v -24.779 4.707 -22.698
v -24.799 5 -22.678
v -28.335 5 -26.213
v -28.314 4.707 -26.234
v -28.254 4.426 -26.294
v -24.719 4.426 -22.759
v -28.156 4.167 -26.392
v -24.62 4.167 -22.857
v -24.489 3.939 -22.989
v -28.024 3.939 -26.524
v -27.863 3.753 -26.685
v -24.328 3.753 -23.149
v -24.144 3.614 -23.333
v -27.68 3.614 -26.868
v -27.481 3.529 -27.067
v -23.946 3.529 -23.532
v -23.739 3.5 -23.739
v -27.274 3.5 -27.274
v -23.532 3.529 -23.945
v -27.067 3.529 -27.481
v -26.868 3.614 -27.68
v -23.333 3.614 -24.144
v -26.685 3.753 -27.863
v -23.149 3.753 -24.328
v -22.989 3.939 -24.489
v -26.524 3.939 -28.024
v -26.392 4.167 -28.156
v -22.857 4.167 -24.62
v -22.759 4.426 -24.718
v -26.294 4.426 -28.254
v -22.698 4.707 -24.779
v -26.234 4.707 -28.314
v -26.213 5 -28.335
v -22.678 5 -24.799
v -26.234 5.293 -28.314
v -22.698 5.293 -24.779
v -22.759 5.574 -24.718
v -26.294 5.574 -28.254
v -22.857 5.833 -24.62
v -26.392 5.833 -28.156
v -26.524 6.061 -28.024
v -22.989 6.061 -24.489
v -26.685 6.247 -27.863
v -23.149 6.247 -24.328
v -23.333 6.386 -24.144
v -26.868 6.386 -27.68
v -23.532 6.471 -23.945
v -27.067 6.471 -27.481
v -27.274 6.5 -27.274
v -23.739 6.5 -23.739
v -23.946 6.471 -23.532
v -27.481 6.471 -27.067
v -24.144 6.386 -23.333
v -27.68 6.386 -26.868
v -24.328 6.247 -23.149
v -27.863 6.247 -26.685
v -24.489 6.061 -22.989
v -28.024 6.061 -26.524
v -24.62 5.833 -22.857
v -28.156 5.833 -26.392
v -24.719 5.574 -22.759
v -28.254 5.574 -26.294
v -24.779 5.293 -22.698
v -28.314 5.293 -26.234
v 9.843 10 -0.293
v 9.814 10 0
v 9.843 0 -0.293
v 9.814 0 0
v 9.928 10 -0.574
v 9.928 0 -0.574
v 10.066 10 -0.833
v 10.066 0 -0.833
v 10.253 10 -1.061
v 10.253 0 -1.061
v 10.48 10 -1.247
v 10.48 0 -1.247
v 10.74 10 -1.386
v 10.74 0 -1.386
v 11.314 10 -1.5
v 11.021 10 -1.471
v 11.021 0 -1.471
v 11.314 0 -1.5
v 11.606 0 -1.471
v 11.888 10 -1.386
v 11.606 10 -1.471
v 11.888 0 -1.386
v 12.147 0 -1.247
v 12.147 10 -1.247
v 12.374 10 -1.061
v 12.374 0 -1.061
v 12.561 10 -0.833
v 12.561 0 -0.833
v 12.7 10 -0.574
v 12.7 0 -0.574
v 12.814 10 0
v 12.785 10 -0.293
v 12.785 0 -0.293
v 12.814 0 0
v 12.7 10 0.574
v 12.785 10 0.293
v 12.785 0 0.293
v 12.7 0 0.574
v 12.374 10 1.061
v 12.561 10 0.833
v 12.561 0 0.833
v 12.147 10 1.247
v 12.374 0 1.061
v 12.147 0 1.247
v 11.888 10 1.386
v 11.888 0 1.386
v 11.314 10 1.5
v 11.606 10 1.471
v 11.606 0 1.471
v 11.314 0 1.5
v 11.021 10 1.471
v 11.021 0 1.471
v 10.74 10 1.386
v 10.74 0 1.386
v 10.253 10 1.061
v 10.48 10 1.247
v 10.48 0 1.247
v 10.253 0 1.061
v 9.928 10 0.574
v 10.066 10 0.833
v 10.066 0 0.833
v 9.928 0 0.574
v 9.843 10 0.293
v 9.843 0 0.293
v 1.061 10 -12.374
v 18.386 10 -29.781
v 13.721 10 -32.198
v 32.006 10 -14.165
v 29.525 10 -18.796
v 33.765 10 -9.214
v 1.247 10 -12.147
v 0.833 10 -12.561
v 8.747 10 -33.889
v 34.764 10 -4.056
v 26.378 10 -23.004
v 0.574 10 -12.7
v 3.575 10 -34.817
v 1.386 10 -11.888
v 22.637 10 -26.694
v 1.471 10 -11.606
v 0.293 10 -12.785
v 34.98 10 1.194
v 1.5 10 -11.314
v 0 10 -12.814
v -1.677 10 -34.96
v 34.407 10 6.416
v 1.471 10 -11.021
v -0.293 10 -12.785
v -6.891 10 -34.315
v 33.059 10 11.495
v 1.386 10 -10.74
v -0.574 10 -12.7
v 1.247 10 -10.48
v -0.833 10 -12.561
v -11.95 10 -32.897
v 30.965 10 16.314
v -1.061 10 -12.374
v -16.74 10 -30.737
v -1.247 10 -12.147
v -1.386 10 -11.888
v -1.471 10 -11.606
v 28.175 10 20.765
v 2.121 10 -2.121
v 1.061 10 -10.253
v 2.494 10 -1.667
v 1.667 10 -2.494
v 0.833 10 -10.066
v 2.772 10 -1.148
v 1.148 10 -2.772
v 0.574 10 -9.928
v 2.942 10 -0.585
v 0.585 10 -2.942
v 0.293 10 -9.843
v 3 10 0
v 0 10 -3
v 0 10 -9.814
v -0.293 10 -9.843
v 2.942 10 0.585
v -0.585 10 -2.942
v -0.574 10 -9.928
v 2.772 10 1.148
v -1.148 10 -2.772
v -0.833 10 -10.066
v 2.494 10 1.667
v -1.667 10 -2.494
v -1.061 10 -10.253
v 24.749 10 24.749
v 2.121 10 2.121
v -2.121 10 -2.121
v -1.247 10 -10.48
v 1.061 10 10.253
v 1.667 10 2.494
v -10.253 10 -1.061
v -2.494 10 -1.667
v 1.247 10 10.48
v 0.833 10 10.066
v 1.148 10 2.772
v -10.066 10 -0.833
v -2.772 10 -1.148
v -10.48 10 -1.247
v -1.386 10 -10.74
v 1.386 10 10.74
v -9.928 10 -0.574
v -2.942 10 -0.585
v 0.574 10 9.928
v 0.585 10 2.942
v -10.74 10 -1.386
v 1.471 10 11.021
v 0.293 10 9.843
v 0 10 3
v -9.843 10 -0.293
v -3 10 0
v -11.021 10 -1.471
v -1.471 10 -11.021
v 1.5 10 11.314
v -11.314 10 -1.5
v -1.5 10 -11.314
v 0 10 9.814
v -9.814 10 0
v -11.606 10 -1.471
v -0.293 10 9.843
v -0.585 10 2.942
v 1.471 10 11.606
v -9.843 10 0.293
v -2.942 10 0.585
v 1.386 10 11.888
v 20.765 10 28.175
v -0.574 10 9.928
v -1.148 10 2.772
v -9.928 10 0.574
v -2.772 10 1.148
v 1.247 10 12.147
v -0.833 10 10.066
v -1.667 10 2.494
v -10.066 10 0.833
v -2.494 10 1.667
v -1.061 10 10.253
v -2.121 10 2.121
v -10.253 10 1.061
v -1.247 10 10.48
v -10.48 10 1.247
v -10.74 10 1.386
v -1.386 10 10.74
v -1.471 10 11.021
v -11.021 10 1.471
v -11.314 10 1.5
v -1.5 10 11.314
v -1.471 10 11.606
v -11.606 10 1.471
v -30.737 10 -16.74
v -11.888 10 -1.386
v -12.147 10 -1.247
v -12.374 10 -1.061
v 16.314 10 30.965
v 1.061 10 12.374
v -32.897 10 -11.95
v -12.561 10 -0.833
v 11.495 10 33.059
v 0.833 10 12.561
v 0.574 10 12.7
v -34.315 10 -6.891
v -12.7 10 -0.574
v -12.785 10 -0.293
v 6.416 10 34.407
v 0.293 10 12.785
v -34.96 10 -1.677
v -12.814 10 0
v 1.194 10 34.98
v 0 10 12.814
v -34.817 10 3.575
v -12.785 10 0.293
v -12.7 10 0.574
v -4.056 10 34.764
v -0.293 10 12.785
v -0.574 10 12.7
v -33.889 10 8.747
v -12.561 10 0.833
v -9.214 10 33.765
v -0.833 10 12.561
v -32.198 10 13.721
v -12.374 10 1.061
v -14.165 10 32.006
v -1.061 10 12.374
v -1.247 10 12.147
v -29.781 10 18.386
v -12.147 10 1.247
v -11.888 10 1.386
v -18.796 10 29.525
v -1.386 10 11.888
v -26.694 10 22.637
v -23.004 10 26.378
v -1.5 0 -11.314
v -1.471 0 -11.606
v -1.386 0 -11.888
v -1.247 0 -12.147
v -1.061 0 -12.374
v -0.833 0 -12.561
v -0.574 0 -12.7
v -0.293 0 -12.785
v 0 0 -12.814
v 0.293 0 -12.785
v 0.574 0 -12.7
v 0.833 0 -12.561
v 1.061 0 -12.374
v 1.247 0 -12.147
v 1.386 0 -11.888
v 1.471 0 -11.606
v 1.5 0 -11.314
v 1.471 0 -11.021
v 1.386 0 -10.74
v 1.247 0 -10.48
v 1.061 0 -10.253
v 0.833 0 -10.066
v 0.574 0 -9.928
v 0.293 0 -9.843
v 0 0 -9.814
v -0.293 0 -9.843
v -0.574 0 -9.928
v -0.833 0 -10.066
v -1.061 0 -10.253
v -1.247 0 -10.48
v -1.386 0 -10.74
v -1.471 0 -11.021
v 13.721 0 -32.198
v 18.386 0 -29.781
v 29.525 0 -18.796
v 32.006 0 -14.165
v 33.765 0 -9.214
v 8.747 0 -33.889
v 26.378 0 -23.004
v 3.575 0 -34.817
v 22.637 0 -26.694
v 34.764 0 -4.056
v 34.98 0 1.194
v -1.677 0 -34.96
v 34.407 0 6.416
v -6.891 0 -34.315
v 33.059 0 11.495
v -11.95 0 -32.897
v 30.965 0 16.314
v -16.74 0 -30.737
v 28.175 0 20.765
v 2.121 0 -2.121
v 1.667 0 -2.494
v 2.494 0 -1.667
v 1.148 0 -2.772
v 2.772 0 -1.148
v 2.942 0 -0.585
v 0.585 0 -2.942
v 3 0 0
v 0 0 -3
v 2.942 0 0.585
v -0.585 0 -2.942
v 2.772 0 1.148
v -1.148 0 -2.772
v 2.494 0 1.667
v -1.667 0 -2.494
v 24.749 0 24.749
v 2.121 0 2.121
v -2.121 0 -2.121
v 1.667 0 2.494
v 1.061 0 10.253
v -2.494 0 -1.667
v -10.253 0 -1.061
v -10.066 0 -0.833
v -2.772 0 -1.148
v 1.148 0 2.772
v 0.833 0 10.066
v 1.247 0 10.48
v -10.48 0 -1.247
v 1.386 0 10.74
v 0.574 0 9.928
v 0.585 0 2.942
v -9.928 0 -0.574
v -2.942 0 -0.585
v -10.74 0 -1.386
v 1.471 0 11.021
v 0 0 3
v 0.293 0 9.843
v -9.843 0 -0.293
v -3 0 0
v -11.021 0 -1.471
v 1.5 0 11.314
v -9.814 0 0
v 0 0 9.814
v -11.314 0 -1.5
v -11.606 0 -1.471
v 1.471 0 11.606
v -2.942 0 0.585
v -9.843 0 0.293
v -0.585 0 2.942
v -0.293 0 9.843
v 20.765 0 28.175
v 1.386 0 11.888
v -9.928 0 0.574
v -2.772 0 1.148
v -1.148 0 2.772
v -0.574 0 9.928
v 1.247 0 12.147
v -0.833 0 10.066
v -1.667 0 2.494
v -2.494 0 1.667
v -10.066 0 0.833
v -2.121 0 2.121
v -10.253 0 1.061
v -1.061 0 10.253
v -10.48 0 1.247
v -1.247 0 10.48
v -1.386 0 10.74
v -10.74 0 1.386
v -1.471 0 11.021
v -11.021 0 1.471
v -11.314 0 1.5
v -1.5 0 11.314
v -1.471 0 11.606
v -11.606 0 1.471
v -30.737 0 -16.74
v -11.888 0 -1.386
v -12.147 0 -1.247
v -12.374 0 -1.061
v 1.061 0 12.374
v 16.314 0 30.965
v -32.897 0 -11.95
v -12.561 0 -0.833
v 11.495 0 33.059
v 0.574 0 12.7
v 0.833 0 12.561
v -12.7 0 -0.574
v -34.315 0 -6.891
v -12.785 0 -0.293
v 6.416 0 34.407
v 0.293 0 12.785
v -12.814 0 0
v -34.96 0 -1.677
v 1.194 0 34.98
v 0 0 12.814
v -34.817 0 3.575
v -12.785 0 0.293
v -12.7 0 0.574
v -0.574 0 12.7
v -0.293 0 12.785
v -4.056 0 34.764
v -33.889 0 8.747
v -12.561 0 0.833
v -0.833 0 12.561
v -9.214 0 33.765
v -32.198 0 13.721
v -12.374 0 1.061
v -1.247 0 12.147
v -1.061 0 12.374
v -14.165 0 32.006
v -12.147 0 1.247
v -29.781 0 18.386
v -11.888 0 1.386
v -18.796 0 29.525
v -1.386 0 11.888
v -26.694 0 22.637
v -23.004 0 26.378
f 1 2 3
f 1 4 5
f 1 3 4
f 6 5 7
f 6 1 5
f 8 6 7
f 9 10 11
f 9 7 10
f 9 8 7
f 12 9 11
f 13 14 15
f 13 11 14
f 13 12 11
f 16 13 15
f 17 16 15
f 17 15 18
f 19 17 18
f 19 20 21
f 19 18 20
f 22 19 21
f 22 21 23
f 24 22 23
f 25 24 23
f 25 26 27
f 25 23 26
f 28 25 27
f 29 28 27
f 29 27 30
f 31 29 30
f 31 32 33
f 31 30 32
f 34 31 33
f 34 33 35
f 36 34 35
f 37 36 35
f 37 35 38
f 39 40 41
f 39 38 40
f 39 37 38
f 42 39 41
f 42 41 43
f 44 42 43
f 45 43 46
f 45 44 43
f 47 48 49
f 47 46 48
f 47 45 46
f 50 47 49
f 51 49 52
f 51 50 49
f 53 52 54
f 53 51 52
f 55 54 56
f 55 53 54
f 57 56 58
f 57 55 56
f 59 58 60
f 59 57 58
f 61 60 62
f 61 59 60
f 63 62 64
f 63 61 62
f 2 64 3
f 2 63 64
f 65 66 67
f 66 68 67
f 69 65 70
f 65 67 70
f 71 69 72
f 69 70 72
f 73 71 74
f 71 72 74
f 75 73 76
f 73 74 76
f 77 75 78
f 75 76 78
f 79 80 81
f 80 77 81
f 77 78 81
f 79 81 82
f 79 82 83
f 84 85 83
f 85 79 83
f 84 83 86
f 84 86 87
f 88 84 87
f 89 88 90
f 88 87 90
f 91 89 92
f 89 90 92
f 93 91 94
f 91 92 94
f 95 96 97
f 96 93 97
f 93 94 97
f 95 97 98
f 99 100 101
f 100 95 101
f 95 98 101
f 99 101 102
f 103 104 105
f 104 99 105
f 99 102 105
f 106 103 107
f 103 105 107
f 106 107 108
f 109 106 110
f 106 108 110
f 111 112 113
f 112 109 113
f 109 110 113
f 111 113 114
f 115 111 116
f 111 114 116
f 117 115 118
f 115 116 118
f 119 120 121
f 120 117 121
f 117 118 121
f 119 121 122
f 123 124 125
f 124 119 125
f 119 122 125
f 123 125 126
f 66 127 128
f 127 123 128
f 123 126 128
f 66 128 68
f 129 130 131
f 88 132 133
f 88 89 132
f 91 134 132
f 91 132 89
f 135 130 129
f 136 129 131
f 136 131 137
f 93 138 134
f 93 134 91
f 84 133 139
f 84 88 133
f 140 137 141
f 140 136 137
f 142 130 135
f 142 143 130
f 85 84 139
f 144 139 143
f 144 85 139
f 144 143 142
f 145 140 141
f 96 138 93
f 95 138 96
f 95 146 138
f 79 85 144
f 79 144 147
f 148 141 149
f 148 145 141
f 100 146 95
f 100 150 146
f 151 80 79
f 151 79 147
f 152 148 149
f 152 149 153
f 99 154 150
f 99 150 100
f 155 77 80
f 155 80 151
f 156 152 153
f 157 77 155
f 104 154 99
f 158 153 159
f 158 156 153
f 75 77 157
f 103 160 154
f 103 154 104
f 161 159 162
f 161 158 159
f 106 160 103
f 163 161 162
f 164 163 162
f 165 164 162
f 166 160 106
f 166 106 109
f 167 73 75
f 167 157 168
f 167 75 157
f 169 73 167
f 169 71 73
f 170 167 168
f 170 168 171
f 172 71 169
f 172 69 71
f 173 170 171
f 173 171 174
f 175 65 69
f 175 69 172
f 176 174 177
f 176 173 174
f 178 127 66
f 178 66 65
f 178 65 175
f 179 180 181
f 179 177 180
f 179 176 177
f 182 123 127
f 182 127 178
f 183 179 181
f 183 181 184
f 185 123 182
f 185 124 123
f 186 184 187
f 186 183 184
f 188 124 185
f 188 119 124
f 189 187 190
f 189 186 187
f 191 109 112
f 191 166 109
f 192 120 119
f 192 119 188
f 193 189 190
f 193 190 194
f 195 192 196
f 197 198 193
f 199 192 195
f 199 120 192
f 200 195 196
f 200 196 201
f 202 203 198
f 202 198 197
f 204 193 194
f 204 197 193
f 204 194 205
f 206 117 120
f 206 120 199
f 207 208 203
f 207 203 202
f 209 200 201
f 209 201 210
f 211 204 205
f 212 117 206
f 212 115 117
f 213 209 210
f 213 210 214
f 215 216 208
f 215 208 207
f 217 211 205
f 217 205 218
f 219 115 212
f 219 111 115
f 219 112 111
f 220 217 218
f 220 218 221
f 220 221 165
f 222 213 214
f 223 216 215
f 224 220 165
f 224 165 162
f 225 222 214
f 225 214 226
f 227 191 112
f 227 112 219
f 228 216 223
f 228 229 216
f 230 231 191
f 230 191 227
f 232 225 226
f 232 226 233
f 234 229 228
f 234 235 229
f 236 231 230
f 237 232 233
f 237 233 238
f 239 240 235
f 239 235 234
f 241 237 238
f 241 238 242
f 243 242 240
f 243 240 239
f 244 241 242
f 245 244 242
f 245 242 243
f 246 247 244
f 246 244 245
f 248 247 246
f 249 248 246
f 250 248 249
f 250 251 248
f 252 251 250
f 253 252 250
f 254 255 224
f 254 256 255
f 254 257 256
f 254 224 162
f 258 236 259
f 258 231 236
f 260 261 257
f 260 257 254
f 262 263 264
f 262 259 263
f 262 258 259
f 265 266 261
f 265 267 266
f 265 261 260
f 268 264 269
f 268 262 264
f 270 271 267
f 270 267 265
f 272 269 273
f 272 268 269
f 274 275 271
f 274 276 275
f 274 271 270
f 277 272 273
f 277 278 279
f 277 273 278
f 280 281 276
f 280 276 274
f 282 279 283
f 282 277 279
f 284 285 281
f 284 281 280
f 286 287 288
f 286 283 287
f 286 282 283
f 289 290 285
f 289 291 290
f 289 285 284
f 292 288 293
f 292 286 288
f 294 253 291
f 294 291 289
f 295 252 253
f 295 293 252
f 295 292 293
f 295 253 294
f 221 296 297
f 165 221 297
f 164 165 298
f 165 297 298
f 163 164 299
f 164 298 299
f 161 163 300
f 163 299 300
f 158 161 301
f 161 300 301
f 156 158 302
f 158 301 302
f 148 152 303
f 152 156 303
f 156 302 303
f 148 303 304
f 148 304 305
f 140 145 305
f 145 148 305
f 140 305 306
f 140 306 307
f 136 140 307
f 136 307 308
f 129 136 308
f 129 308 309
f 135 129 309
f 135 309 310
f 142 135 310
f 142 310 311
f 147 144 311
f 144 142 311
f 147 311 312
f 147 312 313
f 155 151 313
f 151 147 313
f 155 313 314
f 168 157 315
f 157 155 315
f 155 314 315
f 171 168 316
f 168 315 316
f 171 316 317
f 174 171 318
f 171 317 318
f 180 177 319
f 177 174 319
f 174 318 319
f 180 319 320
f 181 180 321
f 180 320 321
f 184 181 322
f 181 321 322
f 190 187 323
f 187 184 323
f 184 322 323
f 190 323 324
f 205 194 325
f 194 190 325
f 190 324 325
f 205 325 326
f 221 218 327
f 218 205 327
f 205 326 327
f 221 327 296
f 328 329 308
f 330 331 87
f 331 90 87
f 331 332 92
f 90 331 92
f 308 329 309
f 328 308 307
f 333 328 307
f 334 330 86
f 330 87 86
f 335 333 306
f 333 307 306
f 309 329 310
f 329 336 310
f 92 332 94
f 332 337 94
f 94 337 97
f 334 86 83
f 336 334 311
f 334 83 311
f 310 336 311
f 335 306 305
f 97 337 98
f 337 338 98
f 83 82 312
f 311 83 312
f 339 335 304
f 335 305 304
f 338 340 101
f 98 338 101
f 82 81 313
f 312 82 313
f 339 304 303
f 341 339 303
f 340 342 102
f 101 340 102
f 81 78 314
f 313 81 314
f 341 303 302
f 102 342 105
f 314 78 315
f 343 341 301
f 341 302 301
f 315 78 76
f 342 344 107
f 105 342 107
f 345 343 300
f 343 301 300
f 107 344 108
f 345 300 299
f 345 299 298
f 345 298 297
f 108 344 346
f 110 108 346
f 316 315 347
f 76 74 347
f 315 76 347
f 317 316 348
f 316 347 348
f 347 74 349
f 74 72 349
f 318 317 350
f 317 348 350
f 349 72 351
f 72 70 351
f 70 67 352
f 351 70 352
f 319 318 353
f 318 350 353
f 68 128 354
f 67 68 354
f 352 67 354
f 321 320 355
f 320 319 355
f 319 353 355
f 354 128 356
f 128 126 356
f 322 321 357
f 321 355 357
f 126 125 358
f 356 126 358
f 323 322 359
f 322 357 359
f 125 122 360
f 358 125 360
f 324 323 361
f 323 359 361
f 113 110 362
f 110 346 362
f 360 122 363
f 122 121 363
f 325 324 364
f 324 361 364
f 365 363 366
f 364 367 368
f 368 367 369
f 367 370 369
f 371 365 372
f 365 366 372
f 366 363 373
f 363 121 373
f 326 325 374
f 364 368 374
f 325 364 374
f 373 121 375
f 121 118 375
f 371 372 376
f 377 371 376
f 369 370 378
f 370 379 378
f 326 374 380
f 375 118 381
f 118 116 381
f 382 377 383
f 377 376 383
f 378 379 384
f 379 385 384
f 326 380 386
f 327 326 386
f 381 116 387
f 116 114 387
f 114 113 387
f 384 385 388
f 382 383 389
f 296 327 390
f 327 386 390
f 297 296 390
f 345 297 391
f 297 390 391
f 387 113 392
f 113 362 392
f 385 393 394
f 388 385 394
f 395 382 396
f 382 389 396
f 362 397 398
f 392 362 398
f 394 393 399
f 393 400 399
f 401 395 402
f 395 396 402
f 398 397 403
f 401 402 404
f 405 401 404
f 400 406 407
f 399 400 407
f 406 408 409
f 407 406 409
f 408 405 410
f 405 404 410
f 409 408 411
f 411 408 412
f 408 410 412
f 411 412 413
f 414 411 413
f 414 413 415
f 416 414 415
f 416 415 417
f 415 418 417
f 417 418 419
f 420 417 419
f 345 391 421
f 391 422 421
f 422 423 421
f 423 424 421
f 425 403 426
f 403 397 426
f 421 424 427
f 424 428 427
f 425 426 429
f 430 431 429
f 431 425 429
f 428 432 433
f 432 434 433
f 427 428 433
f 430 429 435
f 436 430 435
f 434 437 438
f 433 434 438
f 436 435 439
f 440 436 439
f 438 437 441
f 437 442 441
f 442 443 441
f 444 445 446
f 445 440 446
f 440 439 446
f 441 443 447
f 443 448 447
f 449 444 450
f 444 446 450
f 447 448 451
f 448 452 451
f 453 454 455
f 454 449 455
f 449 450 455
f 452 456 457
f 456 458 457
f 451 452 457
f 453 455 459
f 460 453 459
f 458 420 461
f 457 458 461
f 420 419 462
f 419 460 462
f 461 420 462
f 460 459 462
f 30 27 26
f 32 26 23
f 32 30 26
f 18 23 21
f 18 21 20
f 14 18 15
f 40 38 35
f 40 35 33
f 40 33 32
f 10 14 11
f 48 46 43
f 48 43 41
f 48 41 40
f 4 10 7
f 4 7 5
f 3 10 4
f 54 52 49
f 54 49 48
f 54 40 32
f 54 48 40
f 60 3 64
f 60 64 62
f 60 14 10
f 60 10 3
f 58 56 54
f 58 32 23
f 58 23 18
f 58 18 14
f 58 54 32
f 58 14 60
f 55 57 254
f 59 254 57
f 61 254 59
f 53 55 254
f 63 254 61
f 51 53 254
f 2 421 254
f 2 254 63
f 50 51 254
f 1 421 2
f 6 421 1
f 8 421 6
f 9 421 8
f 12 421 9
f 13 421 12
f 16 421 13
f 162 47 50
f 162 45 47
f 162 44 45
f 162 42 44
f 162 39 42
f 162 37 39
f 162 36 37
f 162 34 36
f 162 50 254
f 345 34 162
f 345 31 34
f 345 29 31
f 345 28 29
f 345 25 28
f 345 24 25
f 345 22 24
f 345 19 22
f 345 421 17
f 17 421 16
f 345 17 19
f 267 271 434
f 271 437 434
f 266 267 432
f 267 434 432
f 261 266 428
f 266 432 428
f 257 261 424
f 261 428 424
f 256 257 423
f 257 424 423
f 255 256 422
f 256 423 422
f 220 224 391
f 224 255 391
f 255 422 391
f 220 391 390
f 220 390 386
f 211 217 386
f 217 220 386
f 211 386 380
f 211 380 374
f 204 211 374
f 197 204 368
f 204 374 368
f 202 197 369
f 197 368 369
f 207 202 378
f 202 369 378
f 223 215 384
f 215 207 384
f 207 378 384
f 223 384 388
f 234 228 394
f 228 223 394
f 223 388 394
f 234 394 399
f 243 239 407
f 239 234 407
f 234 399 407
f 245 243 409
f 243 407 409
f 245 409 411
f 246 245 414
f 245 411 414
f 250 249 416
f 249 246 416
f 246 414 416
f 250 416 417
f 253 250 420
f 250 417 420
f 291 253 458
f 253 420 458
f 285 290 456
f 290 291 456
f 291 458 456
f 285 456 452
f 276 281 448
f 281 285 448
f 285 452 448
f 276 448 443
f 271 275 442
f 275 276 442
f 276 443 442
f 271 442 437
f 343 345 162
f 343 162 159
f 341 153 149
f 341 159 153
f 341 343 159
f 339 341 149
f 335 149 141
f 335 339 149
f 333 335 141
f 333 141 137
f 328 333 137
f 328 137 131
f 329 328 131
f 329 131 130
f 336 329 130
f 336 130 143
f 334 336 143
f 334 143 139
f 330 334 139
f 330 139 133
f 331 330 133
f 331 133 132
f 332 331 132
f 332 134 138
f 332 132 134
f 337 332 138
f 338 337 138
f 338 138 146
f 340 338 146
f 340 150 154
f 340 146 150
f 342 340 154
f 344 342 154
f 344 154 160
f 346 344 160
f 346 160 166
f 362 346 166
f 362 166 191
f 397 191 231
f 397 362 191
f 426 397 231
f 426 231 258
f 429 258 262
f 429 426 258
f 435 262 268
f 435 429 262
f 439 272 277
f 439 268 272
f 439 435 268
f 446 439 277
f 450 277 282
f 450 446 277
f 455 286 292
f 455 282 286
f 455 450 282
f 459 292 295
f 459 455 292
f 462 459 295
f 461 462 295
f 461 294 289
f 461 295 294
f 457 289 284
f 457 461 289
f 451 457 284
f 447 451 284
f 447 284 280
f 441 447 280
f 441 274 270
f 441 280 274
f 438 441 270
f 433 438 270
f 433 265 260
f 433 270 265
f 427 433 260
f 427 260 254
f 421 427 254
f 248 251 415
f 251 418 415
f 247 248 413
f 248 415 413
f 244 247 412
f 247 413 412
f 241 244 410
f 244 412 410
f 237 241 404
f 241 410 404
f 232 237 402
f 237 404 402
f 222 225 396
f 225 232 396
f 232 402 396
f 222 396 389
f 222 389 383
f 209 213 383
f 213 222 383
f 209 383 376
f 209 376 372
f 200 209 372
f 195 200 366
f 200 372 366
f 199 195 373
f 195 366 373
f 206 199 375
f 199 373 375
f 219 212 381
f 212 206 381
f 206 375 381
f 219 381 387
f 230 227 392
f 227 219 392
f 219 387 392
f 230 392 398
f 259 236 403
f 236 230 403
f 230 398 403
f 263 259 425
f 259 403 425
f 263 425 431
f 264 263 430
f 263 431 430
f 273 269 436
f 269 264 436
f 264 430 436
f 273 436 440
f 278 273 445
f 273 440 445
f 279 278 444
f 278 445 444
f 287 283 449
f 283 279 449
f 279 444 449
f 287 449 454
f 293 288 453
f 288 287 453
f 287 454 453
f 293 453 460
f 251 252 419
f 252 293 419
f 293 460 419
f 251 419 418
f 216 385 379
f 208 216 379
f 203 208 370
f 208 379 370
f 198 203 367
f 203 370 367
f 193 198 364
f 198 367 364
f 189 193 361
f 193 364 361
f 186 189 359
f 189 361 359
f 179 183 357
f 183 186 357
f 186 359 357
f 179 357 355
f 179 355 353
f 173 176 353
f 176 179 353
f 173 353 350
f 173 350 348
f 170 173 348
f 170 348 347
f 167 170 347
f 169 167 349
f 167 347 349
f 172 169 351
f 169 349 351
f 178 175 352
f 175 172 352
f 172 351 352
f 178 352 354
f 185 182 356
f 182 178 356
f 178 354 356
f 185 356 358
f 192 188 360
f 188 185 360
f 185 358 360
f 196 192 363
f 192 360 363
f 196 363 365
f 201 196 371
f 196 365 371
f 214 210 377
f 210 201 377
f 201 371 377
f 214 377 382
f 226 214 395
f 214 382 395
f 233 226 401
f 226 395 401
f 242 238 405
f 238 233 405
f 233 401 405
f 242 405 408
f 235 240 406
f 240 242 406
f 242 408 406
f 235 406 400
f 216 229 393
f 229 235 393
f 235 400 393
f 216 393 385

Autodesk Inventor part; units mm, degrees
ref_plane "YZ Plane" through (0, 0, 0) normal (1, 0, 0) x (0, 1, 0)
ref_plane "XZ Plane" through (0, 0, 0) normal (0, 1, 0) x (-1, 0, 0)
ref_plane "XY Plane" through (0, 0, 0) normal (0, 0, 1) x (1, 0, 0)
sketch "Sketch1" plane through (0, 0, 0) normal (0, 1, 0) x (-1, 0, 0)
  arc A0 (30.7371, -16.74) -> (16.74, -30.7371) centre (0, 0) ccw
  line L0 (30.7371, -16.74) -> (16.74, -30.7371)
  circle A1 centre (11.3137, 0) radius 1.5
  line L1 (0, -11.3137) -> (11.3137, 0) construction
  line L2 (11.3137, 0) -> (0, 11.3137) construction
  circle A2 centre (0, -11.3137) radius 1.5
  circle A3 centre (0, 11.3137) radius 1.5
  line L3 (0, 11.3137) -> (-11.3137, 0) construction
  line L4 (-11.3137, 0) -> (0, -11.3137) construction
  line L5 (11.3137, 0) -> (-11.3137, 0) construction
  line L6 (0, -11.3137) -> (0, 11.3137) construction
  circle A4 centre (-11.3137, 0) radius 1.5
  circle A5 centre (0, 0) radius 3
  dimension "d2" = 70
  dimension "d13" = 16
  dimension "d14" = 3
  dimension "d16" = 6
extrude "Extrusion1" add sketch "Sketch1" along normal blind 10
sketch "Sketch3" plane through (-30.7371, 0, -16.74) normal (-0.7071, 0, -0.7071) x (-0.7071, 0, 0.7071)
  line L0 (-19.7949, 0) -> (0, 0) construction
  line L1 (-19.7949, 10) -> (0, 10) construction
  line L2 (0, 0) -> (-19.7949, 10) construction
  circle A0 centre (-9.8974, 5) radius 1.5
  point P0 (-9.8974, 0)
  dimension "d17" = 3
extrude "Extrusion3" add sketch "Sketch3" along normal blind 5
properties part number "Pulley-35"
